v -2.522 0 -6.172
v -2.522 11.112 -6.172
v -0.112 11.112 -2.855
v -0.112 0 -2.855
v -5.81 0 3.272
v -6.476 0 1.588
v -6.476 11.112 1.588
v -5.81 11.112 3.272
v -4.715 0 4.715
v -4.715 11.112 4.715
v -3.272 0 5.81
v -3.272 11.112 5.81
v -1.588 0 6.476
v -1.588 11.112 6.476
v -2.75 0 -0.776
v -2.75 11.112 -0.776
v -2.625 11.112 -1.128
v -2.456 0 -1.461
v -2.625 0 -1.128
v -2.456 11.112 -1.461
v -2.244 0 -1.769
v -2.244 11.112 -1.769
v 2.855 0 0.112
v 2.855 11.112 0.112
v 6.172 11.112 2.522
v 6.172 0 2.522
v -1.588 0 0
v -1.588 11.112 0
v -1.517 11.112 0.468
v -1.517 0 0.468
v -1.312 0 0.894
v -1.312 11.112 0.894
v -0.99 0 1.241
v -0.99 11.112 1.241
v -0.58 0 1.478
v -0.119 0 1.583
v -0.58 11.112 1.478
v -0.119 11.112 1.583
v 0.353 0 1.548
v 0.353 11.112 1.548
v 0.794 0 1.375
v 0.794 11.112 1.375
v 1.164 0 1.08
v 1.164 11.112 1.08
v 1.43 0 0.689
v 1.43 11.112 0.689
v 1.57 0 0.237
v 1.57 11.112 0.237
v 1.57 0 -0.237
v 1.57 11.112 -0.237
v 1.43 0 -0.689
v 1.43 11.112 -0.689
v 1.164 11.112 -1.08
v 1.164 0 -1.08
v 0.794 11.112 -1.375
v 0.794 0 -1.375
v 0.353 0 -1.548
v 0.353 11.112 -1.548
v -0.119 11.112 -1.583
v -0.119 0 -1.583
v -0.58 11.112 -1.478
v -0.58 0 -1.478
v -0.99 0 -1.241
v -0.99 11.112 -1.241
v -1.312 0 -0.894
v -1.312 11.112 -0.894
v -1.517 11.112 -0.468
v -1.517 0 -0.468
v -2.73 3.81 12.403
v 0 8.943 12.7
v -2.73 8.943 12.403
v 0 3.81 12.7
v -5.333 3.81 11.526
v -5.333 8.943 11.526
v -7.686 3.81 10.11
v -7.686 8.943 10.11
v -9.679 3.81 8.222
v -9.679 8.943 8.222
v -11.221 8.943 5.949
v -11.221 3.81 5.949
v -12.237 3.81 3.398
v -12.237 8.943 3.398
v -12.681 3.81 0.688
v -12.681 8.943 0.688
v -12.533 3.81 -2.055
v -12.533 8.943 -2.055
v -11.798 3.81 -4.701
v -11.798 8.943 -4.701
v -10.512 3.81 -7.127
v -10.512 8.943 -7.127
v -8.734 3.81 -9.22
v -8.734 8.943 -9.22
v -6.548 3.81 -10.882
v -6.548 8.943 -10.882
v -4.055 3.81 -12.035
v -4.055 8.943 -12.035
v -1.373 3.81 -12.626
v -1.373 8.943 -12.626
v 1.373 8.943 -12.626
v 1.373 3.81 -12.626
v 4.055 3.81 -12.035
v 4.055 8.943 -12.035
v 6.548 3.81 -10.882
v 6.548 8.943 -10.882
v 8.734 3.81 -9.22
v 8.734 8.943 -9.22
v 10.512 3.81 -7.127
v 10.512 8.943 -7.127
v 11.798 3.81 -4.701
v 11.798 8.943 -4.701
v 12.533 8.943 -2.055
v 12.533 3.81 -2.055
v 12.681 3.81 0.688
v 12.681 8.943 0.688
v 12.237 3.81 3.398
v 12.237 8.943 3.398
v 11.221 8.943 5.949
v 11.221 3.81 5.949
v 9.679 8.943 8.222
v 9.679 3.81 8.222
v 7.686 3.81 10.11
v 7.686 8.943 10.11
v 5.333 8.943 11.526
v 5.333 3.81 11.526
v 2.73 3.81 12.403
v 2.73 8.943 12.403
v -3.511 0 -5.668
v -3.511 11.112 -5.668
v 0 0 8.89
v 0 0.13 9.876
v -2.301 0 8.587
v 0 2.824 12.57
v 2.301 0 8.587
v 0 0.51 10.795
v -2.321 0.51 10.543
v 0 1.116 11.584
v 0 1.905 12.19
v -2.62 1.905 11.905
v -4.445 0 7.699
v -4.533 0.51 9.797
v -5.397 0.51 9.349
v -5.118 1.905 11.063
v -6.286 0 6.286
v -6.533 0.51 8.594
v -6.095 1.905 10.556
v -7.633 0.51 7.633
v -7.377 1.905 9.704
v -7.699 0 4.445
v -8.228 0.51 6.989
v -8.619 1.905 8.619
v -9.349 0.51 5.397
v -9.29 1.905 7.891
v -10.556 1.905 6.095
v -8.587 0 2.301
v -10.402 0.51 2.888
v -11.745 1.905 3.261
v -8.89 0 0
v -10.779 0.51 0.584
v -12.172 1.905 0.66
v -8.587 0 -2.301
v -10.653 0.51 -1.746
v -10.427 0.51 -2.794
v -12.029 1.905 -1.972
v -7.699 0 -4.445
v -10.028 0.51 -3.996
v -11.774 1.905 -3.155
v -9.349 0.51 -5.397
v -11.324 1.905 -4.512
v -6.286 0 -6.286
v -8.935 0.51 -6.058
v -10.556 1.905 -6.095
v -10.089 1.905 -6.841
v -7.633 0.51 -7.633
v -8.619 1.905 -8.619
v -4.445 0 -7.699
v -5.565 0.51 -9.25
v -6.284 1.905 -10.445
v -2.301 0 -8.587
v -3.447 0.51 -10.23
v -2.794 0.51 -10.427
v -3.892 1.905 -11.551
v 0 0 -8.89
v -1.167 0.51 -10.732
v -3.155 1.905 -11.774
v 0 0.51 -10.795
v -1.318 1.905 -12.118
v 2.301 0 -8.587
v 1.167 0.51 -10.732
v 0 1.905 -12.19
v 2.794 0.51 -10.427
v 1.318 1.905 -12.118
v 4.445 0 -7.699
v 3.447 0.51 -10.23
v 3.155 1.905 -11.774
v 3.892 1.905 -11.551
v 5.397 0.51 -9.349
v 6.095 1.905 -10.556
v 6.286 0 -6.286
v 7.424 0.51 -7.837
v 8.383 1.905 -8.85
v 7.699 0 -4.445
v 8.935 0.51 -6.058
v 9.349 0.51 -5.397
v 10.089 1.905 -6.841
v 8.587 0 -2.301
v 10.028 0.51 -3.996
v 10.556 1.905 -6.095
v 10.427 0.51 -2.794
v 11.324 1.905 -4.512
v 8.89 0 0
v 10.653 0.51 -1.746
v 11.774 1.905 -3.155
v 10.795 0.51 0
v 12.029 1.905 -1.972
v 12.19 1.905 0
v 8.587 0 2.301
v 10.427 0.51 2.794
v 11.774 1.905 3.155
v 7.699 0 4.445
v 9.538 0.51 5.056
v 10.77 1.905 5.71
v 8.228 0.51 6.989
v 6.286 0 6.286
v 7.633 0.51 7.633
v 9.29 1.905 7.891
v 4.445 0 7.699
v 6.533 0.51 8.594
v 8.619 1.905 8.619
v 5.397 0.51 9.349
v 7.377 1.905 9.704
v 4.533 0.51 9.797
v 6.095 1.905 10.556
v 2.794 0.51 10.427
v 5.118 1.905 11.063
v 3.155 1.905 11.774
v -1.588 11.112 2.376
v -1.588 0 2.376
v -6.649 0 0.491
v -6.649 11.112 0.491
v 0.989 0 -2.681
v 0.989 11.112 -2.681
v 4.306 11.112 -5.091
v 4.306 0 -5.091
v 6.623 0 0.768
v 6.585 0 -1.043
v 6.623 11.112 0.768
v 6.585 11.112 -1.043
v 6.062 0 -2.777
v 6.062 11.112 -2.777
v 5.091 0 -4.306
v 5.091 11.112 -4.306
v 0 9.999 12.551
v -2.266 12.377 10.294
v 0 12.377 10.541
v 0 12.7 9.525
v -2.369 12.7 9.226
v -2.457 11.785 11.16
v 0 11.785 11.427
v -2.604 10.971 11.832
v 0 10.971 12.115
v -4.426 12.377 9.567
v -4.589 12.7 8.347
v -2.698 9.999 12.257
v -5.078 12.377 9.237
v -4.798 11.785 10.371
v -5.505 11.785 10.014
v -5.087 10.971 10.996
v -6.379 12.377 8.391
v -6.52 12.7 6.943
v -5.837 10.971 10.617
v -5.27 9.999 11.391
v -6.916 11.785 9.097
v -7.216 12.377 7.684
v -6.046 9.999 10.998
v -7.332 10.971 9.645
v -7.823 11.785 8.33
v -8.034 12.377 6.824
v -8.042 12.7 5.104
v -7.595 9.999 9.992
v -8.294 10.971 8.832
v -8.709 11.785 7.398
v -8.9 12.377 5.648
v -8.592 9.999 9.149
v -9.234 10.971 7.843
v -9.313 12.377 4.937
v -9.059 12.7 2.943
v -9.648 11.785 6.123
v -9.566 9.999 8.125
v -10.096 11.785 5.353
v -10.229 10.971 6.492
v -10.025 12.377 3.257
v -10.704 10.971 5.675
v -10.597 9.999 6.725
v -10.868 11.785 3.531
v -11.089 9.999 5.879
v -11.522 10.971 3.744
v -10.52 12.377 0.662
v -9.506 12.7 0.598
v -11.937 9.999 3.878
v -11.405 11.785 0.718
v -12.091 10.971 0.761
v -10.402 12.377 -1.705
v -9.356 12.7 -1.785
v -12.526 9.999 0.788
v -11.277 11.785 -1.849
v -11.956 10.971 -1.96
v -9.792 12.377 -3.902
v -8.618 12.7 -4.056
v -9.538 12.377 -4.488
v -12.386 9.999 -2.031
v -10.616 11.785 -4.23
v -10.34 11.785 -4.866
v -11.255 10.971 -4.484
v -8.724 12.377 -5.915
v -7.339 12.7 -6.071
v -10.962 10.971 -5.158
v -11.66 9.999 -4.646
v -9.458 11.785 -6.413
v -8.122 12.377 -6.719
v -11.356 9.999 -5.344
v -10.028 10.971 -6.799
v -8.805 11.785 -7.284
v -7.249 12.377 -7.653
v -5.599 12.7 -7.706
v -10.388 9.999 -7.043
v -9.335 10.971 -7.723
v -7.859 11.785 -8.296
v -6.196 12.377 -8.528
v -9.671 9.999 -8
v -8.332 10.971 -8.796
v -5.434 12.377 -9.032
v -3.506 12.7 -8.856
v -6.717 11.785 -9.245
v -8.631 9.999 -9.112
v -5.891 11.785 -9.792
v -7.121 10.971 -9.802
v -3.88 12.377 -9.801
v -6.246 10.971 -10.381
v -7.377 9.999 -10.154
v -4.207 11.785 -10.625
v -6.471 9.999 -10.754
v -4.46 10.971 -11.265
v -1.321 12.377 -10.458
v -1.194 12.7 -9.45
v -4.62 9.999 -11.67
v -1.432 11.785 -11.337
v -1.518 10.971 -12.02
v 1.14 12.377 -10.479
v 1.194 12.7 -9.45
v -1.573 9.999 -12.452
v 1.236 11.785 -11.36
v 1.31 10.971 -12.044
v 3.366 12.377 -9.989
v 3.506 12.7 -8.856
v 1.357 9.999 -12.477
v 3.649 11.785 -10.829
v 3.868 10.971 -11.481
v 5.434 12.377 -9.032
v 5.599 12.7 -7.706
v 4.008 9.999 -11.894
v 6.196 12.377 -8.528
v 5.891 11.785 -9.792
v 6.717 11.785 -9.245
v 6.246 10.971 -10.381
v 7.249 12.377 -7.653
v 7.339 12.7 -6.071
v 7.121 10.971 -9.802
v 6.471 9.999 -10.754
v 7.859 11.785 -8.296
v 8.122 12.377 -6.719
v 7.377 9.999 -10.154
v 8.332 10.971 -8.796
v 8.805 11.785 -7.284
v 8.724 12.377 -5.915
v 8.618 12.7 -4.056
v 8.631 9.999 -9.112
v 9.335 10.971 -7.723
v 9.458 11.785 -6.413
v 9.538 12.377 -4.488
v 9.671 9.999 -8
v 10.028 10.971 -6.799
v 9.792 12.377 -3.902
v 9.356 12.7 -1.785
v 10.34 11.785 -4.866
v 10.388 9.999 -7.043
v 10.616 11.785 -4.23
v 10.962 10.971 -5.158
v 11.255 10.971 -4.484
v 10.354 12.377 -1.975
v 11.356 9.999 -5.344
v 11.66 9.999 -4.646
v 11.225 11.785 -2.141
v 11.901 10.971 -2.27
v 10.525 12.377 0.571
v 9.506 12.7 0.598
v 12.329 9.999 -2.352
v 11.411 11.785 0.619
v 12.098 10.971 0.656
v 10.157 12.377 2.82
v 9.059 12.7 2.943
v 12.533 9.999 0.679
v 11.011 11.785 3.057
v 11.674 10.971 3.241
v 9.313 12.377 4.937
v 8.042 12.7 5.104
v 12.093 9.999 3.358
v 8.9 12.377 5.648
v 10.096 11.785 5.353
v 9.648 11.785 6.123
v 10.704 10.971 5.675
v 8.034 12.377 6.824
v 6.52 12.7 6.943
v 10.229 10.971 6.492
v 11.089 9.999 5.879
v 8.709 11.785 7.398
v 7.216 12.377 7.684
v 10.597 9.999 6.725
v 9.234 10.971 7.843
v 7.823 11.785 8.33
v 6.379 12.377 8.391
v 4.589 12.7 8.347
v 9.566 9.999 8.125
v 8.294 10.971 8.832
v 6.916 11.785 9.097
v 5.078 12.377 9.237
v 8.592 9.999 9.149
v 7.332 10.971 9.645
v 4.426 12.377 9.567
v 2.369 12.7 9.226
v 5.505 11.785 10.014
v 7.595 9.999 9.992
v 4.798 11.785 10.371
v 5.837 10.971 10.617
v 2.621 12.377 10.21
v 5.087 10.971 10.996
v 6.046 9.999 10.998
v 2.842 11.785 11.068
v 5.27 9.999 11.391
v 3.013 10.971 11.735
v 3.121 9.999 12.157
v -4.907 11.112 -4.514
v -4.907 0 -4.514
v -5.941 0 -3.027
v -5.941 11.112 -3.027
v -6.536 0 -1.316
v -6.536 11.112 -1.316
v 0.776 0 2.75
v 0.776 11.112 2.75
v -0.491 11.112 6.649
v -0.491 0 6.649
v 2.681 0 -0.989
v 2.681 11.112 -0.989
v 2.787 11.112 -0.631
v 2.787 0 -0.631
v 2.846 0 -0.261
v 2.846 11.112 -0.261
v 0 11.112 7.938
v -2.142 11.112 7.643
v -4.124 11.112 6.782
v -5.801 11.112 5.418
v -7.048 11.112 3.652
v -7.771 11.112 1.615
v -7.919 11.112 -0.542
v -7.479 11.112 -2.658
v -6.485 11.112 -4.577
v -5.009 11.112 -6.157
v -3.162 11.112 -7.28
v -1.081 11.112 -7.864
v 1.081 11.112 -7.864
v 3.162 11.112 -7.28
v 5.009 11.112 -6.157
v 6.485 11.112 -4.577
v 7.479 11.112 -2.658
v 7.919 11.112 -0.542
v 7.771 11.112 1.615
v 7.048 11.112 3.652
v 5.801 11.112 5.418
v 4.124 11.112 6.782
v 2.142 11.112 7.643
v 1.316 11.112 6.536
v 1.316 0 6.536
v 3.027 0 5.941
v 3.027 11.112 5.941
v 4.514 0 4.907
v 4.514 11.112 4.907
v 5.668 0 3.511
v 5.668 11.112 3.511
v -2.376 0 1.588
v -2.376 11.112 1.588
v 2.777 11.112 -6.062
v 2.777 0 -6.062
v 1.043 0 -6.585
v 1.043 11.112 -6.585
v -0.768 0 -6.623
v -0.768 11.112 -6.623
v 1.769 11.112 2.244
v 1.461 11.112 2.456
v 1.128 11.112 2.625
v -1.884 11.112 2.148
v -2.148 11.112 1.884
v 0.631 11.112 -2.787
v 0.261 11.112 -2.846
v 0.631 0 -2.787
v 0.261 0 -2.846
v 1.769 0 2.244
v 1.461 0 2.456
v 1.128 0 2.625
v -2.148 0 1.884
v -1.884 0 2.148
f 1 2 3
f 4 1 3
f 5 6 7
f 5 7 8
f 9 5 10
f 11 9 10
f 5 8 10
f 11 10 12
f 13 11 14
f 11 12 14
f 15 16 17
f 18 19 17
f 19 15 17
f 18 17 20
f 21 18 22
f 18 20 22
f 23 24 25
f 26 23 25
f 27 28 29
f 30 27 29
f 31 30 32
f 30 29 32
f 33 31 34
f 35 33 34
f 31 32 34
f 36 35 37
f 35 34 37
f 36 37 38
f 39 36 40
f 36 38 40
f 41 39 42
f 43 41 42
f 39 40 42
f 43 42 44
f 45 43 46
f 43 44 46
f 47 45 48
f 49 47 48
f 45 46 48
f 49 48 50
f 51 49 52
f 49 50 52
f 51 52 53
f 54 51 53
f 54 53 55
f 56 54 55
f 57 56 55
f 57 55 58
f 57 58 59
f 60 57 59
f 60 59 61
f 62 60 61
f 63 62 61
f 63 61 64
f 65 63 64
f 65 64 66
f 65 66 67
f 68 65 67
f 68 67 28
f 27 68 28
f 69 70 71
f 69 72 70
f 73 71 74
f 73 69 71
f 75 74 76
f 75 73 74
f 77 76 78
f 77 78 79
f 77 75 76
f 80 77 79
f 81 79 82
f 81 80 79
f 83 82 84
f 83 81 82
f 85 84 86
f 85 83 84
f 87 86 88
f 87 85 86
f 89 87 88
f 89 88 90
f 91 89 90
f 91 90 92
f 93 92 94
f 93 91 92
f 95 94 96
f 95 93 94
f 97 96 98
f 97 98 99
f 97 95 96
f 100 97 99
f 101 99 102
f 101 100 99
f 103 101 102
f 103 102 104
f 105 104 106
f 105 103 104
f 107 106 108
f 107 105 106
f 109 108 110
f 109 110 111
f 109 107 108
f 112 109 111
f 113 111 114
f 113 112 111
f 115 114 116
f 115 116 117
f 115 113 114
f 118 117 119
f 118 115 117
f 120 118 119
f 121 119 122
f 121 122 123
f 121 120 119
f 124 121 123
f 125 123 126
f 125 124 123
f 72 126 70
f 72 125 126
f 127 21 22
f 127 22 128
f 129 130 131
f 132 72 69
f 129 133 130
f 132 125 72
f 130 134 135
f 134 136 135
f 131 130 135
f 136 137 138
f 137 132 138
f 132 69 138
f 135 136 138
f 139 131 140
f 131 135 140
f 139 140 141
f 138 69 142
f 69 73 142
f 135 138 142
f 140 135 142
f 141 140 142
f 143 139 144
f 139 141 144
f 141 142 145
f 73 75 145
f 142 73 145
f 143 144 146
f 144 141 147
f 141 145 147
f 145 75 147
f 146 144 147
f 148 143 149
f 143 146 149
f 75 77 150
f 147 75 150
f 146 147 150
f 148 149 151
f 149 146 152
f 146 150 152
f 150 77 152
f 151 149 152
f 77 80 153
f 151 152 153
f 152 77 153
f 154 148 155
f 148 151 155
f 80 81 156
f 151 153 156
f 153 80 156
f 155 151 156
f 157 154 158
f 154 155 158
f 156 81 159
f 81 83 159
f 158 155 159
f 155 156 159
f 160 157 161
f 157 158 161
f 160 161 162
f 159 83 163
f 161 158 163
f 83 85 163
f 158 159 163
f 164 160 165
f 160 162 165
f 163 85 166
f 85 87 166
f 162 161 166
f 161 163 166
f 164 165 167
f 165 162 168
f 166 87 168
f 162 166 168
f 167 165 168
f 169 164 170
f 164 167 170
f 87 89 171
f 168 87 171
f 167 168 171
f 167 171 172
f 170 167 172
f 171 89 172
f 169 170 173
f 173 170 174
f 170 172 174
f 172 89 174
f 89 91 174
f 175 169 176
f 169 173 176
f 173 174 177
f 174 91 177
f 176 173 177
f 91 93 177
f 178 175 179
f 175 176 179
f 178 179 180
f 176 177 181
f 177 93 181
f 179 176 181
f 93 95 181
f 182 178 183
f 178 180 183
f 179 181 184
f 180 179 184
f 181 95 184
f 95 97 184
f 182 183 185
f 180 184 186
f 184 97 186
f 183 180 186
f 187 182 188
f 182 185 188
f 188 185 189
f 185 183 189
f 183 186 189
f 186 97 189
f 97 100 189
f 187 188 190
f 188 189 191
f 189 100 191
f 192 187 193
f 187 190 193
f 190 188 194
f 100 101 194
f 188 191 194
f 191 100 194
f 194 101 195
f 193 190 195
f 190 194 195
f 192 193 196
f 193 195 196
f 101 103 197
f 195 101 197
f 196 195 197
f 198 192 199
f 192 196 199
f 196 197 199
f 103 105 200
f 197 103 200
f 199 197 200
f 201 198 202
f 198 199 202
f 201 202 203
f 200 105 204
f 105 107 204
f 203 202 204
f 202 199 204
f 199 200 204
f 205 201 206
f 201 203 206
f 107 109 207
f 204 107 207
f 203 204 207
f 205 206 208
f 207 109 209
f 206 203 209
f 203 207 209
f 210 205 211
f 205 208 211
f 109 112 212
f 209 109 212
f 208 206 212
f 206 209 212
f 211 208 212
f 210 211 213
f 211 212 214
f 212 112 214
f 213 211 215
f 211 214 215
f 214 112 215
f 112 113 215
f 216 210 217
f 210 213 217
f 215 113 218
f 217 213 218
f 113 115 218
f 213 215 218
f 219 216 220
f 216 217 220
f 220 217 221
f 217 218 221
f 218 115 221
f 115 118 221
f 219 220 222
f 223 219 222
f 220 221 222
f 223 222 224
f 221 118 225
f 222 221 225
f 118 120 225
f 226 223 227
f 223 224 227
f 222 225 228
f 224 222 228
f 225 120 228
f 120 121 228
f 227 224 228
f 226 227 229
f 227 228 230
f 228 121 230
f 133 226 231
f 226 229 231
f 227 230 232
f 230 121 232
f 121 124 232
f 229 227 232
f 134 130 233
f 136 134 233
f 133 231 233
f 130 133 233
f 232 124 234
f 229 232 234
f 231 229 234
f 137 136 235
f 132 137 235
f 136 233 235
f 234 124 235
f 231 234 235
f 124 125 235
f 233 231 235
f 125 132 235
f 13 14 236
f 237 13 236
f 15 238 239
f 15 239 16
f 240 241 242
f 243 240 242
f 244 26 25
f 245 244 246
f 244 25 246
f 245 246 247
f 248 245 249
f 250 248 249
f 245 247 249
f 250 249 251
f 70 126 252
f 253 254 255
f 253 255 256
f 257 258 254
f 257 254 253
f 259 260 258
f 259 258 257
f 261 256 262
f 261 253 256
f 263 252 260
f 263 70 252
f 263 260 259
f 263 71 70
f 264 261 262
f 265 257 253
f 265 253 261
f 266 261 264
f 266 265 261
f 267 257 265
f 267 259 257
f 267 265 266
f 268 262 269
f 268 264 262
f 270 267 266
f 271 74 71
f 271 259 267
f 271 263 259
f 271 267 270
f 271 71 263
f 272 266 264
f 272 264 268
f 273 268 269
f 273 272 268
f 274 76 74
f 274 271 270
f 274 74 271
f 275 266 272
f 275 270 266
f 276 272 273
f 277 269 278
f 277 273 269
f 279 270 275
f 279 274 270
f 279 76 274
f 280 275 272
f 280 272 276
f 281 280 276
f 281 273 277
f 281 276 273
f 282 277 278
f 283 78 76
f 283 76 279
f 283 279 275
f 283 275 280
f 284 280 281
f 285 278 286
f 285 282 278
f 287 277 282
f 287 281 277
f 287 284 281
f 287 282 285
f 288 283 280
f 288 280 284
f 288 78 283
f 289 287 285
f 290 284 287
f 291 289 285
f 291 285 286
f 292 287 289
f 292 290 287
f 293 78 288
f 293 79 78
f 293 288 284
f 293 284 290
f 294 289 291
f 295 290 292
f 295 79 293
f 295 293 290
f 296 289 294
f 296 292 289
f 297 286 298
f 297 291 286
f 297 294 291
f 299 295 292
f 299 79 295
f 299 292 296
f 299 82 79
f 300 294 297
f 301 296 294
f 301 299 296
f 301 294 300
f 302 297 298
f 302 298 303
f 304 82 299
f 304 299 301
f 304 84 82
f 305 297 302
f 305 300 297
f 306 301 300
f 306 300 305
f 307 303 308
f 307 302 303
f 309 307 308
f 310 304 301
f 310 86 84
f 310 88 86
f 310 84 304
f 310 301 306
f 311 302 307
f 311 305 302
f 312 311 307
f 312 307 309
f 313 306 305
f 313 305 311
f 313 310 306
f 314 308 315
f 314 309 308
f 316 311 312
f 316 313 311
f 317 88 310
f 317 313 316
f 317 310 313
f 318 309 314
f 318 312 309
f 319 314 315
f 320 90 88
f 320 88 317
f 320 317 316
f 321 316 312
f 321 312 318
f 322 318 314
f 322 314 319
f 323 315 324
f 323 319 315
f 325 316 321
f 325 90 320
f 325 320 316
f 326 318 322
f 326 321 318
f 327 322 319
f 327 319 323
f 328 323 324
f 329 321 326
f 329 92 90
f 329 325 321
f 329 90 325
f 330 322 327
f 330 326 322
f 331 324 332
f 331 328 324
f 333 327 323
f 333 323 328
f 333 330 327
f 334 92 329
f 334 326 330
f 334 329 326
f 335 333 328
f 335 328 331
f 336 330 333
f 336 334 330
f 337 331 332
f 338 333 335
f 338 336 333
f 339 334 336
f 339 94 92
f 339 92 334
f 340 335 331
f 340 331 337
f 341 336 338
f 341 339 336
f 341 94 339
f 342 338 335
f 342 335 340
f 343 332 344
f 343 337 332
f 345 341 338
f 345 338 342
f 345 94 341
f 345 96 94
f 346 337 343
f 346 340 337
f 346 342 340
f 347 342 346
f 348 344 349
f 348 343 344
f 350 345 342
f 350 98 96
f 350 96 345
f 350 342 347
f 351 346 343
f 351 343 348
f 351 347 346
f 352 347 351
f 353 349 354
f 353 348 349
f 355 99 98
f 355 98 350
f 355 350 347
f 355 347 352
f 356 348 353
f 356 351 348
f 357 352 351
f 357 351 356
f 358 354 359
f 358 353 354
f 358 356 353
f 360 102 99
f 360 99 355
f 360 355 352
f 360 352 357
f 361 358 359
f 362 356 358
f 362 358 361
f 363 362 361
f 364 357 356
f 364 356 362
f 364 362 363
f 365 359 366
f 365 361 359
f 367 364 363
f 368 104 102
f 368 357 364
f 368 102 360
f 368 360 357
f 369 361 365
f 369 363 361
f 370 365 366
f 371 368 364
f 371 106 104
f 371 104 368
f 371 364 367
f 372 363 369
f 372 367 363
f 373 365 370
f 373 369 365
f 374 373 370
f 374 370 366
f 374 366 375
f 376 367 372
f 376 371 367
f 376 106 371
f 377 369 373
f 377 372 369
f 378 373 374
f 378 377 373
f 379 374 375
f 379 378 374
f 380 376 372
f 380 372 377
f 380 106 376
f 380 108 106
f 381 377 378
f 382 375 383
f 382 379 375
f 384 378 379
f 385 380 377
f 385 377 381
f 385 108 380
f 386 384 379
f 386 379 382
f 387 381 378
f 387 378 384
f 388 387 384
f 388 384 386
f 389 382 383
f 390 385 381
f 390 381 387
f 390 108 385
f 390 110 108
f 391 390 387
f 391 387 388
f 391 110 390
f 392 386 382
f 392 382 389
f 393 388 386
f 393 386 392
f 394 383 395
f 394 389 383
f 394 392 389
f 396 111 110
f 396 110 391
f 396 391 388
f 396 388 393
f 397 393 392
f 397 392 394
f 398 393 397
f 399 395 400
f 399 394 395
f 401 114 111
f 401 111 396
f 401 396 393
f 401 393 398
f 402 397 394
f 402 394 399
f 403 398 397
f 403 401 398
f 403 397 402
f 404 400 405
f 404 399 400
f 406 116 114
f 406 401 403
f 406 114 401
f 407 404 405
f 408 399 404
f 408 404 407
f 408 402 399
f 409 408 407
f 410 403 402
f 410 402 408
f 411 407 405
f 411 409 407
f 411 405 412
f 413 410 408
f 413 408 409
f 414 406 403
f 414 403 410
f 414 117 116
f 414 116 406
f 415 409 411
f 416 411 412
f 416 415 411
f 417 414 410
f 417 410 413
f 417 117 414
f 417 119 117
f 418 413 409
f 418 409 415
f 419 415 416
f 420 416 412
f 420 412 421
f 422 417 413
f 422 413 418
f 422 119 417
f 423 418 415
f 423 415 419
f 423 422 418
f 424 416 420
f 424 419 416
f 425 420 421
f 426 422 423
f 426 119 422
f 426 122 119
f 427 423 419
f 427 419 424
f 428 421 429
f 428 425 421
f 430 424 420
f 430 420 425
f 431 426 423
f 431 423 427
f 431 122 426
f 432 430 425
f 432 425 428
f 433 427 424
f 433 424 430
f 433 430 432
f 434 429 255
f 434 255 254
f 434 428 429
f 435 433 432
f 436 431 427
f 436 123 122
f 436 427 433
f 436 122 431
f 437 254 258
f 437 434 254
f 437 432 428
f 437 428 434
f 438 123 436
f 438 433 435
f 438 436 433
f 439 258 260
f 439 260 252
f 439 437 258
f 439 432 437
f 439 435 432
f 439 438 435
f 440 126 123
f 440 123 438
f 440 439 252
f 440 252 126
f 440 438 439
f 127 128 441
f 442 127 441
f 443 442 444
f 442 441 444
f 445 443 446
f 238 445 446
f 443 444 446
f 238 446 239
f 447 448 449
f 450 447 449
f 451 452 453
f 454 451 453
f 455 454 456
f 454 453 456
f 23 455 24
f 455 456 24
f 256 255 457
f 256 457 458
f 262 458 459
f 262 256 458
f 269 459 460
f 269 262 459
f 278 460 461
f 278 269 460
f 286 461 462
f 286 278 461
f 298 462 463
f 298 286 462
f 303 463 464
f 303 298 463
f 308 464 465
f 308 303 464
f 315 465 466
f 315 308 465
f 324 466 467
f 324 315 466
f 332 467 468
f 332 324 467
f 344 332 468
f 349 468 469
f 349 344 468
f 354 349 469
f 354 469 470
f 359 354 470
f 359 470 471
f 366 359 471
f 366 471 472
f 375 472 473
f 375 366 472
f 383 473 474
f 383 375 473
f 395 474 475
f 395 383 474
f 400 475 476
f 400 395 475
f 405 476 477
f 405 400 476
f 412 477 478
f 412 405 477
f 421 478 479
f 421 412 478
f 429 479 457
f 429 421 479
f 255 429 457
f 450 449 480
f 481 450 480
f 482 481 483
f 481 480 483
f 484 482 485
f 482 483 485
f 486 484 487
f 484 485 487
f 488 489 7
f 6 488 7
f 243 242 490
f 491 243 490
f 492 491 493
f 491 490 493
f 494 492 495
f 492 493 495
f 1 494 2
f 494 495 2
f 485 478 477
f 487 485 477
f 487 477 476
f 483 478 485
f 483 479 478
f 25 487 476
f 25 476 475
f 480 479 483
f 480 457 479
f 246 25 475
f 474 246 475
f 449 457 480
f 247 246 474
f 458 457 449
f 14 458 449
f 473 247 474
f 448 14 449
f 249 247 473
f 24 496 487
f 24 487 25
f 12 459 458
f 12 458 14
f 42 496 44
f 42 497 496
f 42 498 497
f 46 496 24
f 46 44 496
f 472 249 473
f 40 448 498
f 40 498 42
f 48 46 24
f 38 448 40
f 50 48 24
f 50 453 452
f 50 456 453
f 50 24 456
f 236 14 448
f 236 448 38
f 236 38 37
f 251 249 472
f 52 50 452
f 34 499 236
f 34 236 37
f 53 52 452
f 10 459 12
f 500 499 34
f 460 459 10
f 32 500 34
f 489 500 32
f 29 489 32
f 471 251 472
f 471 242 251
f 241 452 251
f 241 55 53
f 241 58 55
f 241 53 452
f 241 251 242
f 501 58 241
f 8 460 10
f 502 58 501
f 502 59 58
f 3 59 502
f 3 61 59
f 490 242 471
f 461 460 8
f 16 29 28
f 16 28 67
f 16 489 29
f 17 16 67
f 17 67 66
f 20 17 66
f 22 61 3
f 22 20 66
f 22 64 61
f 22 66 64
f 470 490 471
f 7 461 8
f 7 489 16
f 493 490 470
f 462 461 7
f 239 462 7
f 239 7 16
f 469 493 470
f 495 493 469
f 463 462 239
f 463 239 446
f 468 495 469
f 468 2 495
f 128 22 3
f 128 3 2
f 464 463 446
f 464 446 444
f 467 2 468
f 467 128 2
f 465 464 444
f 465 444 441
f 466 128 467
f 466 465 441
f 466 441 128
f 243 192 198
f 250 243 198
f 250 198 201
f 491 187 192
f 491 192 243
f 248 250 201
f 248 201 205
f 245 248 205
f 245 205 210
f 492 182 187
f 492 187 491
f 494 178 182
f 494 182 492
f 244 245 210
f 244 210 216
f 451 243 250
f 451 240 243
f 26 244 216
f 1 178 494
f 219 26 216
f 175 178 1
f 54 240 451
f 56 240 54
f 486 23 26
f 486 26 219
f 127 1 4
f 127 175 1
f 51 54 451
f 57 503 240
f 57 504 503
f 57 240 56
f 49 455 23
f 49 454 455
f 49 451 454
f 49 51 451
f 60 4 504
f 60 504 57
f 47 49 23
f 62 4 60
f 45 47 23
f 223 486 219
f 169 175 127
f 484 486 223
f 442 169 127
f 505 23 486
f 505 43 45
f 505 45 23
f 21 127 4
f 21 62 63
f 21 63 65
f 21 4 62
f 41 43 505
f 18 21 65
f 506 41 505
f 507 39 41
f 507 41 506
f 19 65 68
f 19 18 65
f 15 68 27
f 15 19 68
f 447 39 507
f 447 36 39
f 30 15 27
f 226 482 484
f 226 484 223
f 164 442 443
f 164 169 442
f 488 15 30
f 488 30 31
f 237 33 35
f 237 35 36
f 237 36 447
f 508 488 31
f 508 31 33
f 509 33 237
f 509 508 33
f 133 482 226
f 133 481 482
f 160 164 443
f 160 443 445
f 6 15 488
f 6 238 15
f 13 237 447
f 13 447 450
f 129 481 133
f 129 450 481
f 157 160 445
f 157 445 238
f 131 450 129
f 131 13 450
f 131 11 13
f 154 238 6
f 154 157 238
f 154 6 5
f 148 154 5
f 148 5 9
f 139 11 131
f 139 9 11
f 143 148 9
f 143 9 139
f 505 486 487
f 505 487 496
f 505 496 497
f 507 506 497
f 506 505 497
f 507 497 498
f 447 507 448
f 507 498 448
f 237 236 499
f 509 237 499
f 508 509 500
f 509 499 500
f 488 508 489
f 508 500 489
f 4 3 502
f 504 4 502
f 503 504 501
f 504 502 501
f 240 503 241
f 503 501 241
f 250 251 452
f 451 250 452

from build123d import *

# Parameters (mm, degrees)
F3_R     = 1.5875
F4_DEPTH = 12.7
F6_DEPTH = 25.4


# Not quite as in the source:
# - a fillet or chamfer that OpenCascade refuses, or shapes differently, is made with other operations: its cross-section is extruded or revolved along the edge and cut away or added


with BuildPart() as f1:
    # F0 (on Right) → F1 (revolve)
    with BuildSketch(Plane.YZ):
        Polygon((0, 12.7), (0, 0), (11.1125, 0), (11.1125, 7.9375), (12.7, 9.525), (12.7, 12.7), align=None)
    revolve(axis=Axis((0, 5.55625, 0), (0, -1, 0)))

    # F2: fillet of radius 3.81 on 2 edges, made by hand

    # F2_s1 → F2_t2 (revolve, cut)
    with BuildSketch(Plane.YZ):
        with BuildLine():
            ThreePointArc((0, 8.89), (1.1159231637, 11.5840768363), (3.81, 12.7))
            Line((3.81, 12.7), (0, 12.7))
            Line((0, 12.7), (0, 8.89))
        make_face()
    revolve(axis=Axis((0, 0, 0), (0, -1, 0)), mode=Mode.SUBTRACT)

    # F2_s3 → F2_t4 (revolve, cut)
    with BuildSketch(Plane.YZ):
        with BuildLine():
            ThreePointArc((12.7, 9.525), (11.4026337626, 11.7999355663), (8.9432893377, 12.7))
            Line((8.9432893377, 12.7), (12.7, 12.7))
            Line((12.7, 12.7), (12.7, 9.525))
        make_face()
    revolve(axis=Axis((0, 12.7, 0), (0, -1, 0)), mode=Mode.SUBTRACT)

    # F3 (on face) → F4 (cut)
    with BuildSketch(Plane(origin=(0, 11.1125, 0), x_dir=(-1, 0, 0), z_dir=(0, 1, 0))):
        Circle(F3_R)
    extrude(amount=-F4_DEPTH, mode=Mode.SUBTRACT)

    # F5 (on face) → F6 (cut)
    with BuildSketch(Plane(origin=(0, 11.1125, 0), x_dir=(-1, 0, 0), z_dir=(0, 1, 0))):
        with BuildLine():
            Line((-5.668244305, 3.5109204987), (-1.7691005725, 2.2440119016))
            ThreePointArc((-1.7691005725, 2.2440119016), (-1.297277853, 2.5460511429), (-0.7755925376, 2.7502295296))
            Line((-0.7755925376, 2.7502295296), (0.4913160595, 6.6493732622))
            ThreePointArc((0.4913160595, 6.6493732622), (-3.026981657, 5.940786), (-5.668244305, 3.5109204987))
        make_face()
        with BuildLine():
            ThreePointArc((1.5875, 2.3759524406), (2.0205576272, 2.0205576272), (2.3759524406, 1.5875))
            Line((2.3759524406, 1.5875), (6.4757547823, 1.5875))
            ThreePointArc((6.4757547823, 1.5875), (4.7146344636, 4.7146344636), (1.5875, 6.4757547823))
            Line((1.5875, 6.4757547823), (1.5875, 2.3759524406))
        make_face()
        with BuildLine():
            Line((-5.090667637, -4.3058865822), (-2.6808642833, -0.9890768143))
            ThreePointArc((-2.6808642833, -0.9890768143), (-2.8223194333, -0.4470114839), (-2.8552949903, 0.1122353262))
            Line((-2.8552949903, 0.1122353262), (-6.1721047583, 2.5220386799))
            ThreePointArc((-6.1721047583, 2.5220386799), (-6.5854120109, -1.0430267957), (-5.090667637, -4.3058865822))
        make_face()
        with BuildLine():
            Line((2.5220386799, -6.1721047583), (0.1122353262, -2.8552949903))
            ThreePointArc((0.1122353262, -2.8552949903), (-0.4470114839, -2.8223194333), (-0.9890768143, -2.6808642833))
            Line((-0.9890768143, -2.6808642833), (-4.3058865822, -5.090667637))
            ThreePointArc((-4.3058865822, -5.090667637), (-1.0430267957, -6.5854120109), (2.5220386799, -6.1721047583))
        make_face()
        with BuildLine():
            Line((6.6493732622, 0.4913160595), (2.7502295296, -0.7755925376))
            ThreePointArc((2.7502295296, -0.7755925376), (2.5460511429, -1.297277853), (2.2440119016, -1.7691005725))
            Line((2.2440119016, -1.7691005725), (3.5109204987, -5.668244305))
            ThreePointArc((3.5109204987, -5.668244305), (5.940786, -3.026981657), (6.6493732622, 0.4913160595))
        make_face()
    extrude(amount=-F6_DEPTH, mode=Mode.SUBTRACT)


solid = f1.part
